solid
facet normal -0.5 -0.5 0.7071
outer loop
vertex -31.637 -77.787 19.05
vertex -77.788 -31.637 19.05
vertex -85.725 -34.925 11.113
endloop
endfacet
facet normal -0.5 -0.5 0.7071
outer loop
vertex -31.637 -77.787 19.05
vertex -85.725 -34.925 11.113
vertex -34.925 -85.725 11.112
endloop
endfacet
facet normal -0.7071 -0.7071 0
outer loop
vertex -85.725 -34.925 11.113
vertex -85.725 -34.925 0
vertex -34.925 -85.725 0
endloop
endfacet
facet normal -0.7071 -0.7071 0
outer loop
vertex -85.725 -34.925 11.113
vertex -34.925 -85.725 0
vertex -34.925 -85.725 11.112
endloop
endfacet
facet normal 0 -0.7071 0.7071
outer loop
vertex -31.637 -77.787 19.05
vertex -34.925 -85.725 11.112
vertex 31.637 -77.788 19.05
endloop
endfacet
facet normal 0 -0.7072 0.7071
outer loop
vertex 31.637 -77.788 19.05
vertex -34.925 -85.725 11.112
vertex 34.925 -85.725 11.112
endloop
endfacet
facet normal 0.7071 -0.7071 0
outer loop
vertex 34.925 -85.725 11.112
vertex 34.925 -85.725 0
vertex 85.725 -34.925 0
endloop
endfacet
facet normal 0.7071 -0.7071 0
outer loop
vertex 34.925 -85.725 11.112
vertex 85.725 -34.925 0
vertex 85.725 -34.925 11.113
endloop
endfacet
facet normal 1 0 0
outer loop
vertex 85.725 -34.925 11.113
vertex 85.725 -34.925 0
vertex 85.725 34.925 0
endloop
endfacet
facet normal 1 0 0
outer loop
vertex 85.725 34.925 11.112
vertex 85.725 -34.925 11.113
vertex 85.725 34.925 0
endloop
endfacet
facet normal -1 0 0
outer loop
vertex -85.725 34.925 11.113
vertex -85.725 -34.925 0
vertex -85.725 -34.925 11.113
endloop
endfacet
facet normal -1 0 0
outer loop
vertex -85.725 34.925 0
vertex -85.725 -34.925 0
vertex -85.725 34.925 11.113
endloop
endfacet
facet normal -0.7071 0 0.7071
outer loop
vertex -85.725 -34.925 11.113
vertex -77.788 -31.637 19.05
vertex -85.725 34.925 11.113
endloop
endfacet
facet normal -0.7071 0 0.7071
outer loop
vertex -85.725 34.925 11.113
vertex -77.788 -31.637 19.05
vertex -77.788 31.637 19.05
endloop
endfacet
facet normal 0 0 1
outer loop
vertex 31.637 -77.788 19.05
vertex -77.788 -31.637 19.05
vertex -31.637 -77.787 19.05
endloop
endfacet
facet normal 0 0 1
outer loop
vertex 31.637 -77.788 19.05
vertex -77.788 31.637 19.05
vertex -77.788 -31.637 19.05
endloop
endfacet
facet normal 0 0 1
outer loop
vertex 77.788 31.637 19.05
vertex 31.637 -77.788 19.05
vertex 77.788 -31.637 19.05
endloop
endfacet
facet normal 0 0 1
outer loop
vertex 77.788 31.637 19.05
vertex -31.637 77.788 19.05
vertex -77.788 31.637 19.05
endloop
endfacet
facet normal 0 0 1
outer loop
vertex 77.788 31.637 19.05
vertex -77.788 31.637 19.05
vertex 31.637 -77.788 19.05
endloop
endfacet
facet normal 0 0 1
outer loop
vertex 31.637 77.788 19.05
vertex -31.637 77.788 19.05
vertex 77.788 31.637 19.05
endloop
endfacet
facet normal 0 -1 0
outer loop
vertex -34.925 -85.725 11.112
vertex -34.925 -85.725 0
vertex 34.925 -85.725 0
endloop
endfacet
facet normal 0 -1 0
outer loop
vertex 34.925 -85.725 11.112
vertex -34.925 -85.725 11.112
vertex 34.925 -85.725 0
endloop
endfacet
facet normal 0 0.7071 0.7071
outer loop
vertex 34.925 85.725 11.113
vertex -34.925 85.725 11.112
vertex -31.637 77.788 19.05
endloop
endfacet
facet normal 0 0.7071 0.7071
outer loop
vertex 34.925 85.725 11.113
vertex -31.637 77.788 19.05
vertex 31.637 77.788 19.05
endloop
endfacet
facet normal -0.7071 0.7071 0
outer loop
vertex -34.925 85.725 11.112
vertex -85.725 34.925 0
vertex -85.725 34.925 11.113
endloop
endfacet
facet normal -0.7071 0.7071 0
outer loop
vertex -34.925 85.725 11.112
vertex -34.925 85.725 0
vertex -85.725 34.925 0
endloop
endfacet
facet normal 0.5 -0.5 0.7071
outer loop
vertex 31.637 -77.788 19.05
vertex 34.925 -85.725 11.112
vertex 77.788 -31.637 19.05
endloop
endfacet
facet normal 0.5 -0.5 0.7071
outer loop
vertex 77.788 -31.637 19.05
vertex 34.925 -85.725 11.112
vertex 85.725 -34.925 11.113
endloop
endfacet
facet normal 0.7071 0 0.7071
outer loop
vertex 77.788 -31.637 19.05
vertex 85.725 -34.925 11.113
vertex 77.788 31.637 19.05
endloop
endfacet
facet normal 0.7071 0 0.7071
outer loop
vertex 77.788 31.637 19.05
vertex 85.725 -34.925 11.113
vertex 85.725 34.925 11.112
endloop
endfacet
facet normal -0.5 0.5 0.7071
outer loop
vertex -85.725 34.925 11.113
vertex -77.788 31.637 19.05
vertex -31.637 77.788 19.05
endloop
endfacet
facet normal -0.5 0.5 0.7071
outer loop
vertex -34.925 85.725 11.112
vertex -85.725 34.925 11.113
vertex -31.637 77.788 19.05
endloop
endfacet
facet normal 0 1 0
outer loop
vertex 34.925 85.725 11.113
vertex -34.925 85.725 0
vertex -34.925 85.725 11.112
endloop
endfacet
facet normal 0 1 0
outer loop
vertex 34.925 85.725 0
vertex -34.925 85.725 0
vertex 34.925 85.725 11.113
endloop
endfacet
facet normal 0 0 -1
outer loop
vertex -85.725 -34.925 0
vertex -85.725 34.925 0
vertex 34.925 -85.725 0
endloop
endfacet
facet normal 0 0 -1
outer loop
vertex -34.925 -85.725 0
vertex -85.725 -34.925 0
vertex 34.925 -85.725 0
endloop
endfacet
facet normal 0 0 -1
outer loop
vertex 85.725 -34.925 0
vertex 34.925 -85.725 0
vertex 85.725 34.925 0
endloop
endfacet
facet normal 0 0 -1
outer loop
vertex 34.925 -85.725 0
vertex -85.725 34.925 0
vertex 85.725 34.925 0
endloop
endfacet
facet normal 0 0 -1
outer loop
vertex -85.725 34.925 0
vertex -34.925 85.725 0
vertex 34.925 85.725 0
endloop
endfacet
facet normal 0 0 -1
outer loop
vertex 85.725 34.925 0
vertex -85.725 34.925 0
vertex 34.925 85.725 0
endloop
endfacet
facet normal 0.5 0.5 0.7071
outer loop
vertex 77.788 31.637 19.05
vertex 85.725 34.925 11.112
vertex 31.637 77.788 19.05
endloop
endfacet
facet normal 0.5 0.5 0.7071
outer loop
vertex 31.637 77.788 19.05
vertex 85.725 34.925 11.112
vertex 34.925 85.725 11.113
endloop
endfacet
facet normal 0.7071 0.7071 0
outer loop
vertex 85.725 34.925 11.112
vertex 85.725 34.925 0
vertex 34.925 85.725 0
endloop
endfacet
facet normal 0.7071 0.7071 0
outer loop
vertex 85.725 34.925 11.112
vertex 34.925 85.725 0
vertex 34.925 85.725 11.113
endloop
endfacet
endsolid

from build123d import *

# Parameters (mm, degrees)
F0_W      = 171.45
F0_H      = 171.45
F1_DEPTH  = 19.05
F3_DEPTH  = 127
F2_W      = 12.7
F2_H      = 17.1814748066
F4_DEPTH  = 203.2
F5_SIZE   = 5.08
F6_DEPTH  = 177.8
F7_SIZE   = 5.08
F8_DEPTH  = 177.8
F9_SIZE   = 5.08
F2_H_2    = 15.875
F10_DEPTH = 152.4
F11_SIZE  = 5.08
F12_SIZE  = 50.8
F13_SIZE  = 7.9375
F15_R     = 19.8103080262
F16_DEPTH = 355.6
F17_SIZE  = 5.08
F18_DEPTH = 25.4


with BuildPart() as f1:
    # F0 (on Top) → F1 (new body)
    with BuildSketch(Plane.XY):
        Rectangle(F0_W, F0_H)
    extrude(amount=F1_DEPTH)

    # F12
    f12_edges = [f1.edges().sort_by_distance(p)[0] for p in [
        (85.725, 85.725, 9.525),
        (-85.725, 85.725, 9.525),
        (85.725, -85.725, 9.525),
        (-85.725, -85.725, 9.525),
    ]]
    chamfer(f12_edges, length=F12_SIZE)

    # F13
    f13_edges = [f1.edges().sort_by_distance(p)[0] for p in [
        (-60.325, -60.325, 19.05),
        (0, -85.725, 19.05),
        (60.325, -60.325, 19.05),
        (85.725, 0, 19.05),
        (60.325, 60.325, 19.05),
        (0, 85.725, 19.05),
        (-60.325, 60.325, 19.05),
        (-85.725, 0, 19.05),
    ]]
    chamfer(f13_edges, length=F13_SIZE)


with BuildPart() as f3:
    # F2 (on face) → F3 (new body)
    with BuildSketch(Plane.XY.offset(19.05)):
        Polygon((-8.0955186849, -20.6375), (7.9502, -20.6375), (20.6375, -9.2439748066), (20.6375, 7.9375), (7.9502, 20.6375), (-7.8052744357, 20.6375), (-20.6375, 7.9375), (-20.6375, -7.9375), align=None)
    extrude(amount=F3_DEPTH)


with BuildPart() as f4:
    # F2 (on face) → F4 (new body)
    with BuildSketch(Plane.XY.offset(19.05)):
        with Locations((26.9875, -0.6532374033)):
            Rectangle(F2_W, F2_H)
    extrude(amount=F4_DEPTH)

    # F5
    f5_edges = [f4.edges().sort_by_distance(p)[0] for p in [
        (33.3375, -0.653237, 222.25),
    ]]
    chamfer(f5_edges, length=F5_SIZE)


with BuildPart() as f6:
    # F2 (on face) → F6 (new body)
    with BuildSketch(Plane.XY.offset(19.05)):
        Polygon((-8.1848246077, -33.3375), (7.9502, -33.3375), (7.9502, -20.6375), (-8.0955186849, -20.6375), align=None)
    extrude(amount=F6_DEPTH)

    # F7
    f7_edges = [f6.edges().sort_by_distance(p)[0] for p in [
        (-0.117312, -33.3375, 196.85),
    ]]
    chamfer(f7_edges, length=F7_SIZE)


with BuildPart() as f8:
    # F2 (on face) → F8 (new body)
    with BuildSketch(Plane.XY.offset(19.05)):
        Polygon((-7.8052744357, 20.6375), (7.9502, 20.6375), (7.9502, 33.3375), (-7.7159685129, 33.3375), align=None)
    extrude(amount=F8_DEPTH)

    # F9
    f9_edges = [f8.edges().sort_by_distance(p)[0] for p in [
        (0.117116, 33.3375, 196.85),
    ]]
    chamfer(f9_edges, length=F9_SIZE)


with BuildPart() as f10:
    # F2 (on face) → F10 (new body)
    with BuildSketch(Plane.XY.offset(19.05)):
        with Locations((-26.9875, 0)):
            Rectangle(F2_W, F2_H_2)
    extrude(amount=F10_DEPTH)

    # F11
    f11_edges = [f10.edges().sort_by_distance(p)[0] for p in [
        (-33.3375, 0, 171.45),
    ]]
    chamfer(f11_edges, length=F11_SIZE)


with BuildPart() as f16:
    # F15 (on face) → F16 (new body)
    with BuildSketch(Plane.XY.offset(146.05)):
        Circle(F15_R)
    extrude(amount=F16_DEPTH)

    # F17
    f17_edges = [f16.edges().sort_by_distance(p)[0] for p in [
        (-19.810308, 0, 501.65),
    ]]
    chamfer(f17_edges, length=F17_SIZE)


with BuildPart() as f18:
    # F14 (on face) → F18 (new body)
    with BuildSketch(Plane.XY.offset(146.05)):
        with BuildLine():
            Line((20.6375, -0.9718922405), (20.6375, 0.9718922405))
            ThreePointArc((20.6375, 0.9718922405), (19.6667538049, 6.3300691588), (17.3298010521, 11.2485099579))
            Line((17.3298010521, 11.2485099579), (11.2658427939, 17.3185382443))
            ThreePointArc((11.2658427939, 17.3185382443), (6.3399066616, 19.6635847266), (0.9718922405, 20.6375))
            Line((0.9718922405, 20.6375), (-0.9718922405, 20.6375))
            ThreePointArc((-0.9718922405, 20.6375), (-6.1694748401, 19.7177220027), (-10.9643715831, 17.5109547588))
            Line((-10.9643715831, 17.5109547588), (-17.3964546014, 11.1451490829))
            ThreePointArc((-17.3964546014, 11.1451490829), (-19.685507724, 6.2715043193), (-20.6375, 0.9718922405))
            Line((-20.6375, 0.9718922405), (-20.6375, -0.9718922405))
            ThreePointArc((-20.6375, -0.9718922405), (-19.6458745255, -6.3945754282), (-17.2555997462, -11.3620094251))
            Line((-17.2555997462, -11.3620094251), (-11.5771558663, -17.1119970437))
            ThreePointArc((-11.5771558663, -17.1119970437), (-6.5174339176, -19.6054593393), (-0.9718922405, -20.6375))
            Line((-0.9718922405, -20.6375), (0.9718922405, -20.6375))
            ThreePointArc((0.9718922405, -20.6375), (14.6090893073, -14.6090893073), (20.6375, -0.9718922405))
        make_face()
    extrude(amount=F18_DEPTH)


solid = f1.part
